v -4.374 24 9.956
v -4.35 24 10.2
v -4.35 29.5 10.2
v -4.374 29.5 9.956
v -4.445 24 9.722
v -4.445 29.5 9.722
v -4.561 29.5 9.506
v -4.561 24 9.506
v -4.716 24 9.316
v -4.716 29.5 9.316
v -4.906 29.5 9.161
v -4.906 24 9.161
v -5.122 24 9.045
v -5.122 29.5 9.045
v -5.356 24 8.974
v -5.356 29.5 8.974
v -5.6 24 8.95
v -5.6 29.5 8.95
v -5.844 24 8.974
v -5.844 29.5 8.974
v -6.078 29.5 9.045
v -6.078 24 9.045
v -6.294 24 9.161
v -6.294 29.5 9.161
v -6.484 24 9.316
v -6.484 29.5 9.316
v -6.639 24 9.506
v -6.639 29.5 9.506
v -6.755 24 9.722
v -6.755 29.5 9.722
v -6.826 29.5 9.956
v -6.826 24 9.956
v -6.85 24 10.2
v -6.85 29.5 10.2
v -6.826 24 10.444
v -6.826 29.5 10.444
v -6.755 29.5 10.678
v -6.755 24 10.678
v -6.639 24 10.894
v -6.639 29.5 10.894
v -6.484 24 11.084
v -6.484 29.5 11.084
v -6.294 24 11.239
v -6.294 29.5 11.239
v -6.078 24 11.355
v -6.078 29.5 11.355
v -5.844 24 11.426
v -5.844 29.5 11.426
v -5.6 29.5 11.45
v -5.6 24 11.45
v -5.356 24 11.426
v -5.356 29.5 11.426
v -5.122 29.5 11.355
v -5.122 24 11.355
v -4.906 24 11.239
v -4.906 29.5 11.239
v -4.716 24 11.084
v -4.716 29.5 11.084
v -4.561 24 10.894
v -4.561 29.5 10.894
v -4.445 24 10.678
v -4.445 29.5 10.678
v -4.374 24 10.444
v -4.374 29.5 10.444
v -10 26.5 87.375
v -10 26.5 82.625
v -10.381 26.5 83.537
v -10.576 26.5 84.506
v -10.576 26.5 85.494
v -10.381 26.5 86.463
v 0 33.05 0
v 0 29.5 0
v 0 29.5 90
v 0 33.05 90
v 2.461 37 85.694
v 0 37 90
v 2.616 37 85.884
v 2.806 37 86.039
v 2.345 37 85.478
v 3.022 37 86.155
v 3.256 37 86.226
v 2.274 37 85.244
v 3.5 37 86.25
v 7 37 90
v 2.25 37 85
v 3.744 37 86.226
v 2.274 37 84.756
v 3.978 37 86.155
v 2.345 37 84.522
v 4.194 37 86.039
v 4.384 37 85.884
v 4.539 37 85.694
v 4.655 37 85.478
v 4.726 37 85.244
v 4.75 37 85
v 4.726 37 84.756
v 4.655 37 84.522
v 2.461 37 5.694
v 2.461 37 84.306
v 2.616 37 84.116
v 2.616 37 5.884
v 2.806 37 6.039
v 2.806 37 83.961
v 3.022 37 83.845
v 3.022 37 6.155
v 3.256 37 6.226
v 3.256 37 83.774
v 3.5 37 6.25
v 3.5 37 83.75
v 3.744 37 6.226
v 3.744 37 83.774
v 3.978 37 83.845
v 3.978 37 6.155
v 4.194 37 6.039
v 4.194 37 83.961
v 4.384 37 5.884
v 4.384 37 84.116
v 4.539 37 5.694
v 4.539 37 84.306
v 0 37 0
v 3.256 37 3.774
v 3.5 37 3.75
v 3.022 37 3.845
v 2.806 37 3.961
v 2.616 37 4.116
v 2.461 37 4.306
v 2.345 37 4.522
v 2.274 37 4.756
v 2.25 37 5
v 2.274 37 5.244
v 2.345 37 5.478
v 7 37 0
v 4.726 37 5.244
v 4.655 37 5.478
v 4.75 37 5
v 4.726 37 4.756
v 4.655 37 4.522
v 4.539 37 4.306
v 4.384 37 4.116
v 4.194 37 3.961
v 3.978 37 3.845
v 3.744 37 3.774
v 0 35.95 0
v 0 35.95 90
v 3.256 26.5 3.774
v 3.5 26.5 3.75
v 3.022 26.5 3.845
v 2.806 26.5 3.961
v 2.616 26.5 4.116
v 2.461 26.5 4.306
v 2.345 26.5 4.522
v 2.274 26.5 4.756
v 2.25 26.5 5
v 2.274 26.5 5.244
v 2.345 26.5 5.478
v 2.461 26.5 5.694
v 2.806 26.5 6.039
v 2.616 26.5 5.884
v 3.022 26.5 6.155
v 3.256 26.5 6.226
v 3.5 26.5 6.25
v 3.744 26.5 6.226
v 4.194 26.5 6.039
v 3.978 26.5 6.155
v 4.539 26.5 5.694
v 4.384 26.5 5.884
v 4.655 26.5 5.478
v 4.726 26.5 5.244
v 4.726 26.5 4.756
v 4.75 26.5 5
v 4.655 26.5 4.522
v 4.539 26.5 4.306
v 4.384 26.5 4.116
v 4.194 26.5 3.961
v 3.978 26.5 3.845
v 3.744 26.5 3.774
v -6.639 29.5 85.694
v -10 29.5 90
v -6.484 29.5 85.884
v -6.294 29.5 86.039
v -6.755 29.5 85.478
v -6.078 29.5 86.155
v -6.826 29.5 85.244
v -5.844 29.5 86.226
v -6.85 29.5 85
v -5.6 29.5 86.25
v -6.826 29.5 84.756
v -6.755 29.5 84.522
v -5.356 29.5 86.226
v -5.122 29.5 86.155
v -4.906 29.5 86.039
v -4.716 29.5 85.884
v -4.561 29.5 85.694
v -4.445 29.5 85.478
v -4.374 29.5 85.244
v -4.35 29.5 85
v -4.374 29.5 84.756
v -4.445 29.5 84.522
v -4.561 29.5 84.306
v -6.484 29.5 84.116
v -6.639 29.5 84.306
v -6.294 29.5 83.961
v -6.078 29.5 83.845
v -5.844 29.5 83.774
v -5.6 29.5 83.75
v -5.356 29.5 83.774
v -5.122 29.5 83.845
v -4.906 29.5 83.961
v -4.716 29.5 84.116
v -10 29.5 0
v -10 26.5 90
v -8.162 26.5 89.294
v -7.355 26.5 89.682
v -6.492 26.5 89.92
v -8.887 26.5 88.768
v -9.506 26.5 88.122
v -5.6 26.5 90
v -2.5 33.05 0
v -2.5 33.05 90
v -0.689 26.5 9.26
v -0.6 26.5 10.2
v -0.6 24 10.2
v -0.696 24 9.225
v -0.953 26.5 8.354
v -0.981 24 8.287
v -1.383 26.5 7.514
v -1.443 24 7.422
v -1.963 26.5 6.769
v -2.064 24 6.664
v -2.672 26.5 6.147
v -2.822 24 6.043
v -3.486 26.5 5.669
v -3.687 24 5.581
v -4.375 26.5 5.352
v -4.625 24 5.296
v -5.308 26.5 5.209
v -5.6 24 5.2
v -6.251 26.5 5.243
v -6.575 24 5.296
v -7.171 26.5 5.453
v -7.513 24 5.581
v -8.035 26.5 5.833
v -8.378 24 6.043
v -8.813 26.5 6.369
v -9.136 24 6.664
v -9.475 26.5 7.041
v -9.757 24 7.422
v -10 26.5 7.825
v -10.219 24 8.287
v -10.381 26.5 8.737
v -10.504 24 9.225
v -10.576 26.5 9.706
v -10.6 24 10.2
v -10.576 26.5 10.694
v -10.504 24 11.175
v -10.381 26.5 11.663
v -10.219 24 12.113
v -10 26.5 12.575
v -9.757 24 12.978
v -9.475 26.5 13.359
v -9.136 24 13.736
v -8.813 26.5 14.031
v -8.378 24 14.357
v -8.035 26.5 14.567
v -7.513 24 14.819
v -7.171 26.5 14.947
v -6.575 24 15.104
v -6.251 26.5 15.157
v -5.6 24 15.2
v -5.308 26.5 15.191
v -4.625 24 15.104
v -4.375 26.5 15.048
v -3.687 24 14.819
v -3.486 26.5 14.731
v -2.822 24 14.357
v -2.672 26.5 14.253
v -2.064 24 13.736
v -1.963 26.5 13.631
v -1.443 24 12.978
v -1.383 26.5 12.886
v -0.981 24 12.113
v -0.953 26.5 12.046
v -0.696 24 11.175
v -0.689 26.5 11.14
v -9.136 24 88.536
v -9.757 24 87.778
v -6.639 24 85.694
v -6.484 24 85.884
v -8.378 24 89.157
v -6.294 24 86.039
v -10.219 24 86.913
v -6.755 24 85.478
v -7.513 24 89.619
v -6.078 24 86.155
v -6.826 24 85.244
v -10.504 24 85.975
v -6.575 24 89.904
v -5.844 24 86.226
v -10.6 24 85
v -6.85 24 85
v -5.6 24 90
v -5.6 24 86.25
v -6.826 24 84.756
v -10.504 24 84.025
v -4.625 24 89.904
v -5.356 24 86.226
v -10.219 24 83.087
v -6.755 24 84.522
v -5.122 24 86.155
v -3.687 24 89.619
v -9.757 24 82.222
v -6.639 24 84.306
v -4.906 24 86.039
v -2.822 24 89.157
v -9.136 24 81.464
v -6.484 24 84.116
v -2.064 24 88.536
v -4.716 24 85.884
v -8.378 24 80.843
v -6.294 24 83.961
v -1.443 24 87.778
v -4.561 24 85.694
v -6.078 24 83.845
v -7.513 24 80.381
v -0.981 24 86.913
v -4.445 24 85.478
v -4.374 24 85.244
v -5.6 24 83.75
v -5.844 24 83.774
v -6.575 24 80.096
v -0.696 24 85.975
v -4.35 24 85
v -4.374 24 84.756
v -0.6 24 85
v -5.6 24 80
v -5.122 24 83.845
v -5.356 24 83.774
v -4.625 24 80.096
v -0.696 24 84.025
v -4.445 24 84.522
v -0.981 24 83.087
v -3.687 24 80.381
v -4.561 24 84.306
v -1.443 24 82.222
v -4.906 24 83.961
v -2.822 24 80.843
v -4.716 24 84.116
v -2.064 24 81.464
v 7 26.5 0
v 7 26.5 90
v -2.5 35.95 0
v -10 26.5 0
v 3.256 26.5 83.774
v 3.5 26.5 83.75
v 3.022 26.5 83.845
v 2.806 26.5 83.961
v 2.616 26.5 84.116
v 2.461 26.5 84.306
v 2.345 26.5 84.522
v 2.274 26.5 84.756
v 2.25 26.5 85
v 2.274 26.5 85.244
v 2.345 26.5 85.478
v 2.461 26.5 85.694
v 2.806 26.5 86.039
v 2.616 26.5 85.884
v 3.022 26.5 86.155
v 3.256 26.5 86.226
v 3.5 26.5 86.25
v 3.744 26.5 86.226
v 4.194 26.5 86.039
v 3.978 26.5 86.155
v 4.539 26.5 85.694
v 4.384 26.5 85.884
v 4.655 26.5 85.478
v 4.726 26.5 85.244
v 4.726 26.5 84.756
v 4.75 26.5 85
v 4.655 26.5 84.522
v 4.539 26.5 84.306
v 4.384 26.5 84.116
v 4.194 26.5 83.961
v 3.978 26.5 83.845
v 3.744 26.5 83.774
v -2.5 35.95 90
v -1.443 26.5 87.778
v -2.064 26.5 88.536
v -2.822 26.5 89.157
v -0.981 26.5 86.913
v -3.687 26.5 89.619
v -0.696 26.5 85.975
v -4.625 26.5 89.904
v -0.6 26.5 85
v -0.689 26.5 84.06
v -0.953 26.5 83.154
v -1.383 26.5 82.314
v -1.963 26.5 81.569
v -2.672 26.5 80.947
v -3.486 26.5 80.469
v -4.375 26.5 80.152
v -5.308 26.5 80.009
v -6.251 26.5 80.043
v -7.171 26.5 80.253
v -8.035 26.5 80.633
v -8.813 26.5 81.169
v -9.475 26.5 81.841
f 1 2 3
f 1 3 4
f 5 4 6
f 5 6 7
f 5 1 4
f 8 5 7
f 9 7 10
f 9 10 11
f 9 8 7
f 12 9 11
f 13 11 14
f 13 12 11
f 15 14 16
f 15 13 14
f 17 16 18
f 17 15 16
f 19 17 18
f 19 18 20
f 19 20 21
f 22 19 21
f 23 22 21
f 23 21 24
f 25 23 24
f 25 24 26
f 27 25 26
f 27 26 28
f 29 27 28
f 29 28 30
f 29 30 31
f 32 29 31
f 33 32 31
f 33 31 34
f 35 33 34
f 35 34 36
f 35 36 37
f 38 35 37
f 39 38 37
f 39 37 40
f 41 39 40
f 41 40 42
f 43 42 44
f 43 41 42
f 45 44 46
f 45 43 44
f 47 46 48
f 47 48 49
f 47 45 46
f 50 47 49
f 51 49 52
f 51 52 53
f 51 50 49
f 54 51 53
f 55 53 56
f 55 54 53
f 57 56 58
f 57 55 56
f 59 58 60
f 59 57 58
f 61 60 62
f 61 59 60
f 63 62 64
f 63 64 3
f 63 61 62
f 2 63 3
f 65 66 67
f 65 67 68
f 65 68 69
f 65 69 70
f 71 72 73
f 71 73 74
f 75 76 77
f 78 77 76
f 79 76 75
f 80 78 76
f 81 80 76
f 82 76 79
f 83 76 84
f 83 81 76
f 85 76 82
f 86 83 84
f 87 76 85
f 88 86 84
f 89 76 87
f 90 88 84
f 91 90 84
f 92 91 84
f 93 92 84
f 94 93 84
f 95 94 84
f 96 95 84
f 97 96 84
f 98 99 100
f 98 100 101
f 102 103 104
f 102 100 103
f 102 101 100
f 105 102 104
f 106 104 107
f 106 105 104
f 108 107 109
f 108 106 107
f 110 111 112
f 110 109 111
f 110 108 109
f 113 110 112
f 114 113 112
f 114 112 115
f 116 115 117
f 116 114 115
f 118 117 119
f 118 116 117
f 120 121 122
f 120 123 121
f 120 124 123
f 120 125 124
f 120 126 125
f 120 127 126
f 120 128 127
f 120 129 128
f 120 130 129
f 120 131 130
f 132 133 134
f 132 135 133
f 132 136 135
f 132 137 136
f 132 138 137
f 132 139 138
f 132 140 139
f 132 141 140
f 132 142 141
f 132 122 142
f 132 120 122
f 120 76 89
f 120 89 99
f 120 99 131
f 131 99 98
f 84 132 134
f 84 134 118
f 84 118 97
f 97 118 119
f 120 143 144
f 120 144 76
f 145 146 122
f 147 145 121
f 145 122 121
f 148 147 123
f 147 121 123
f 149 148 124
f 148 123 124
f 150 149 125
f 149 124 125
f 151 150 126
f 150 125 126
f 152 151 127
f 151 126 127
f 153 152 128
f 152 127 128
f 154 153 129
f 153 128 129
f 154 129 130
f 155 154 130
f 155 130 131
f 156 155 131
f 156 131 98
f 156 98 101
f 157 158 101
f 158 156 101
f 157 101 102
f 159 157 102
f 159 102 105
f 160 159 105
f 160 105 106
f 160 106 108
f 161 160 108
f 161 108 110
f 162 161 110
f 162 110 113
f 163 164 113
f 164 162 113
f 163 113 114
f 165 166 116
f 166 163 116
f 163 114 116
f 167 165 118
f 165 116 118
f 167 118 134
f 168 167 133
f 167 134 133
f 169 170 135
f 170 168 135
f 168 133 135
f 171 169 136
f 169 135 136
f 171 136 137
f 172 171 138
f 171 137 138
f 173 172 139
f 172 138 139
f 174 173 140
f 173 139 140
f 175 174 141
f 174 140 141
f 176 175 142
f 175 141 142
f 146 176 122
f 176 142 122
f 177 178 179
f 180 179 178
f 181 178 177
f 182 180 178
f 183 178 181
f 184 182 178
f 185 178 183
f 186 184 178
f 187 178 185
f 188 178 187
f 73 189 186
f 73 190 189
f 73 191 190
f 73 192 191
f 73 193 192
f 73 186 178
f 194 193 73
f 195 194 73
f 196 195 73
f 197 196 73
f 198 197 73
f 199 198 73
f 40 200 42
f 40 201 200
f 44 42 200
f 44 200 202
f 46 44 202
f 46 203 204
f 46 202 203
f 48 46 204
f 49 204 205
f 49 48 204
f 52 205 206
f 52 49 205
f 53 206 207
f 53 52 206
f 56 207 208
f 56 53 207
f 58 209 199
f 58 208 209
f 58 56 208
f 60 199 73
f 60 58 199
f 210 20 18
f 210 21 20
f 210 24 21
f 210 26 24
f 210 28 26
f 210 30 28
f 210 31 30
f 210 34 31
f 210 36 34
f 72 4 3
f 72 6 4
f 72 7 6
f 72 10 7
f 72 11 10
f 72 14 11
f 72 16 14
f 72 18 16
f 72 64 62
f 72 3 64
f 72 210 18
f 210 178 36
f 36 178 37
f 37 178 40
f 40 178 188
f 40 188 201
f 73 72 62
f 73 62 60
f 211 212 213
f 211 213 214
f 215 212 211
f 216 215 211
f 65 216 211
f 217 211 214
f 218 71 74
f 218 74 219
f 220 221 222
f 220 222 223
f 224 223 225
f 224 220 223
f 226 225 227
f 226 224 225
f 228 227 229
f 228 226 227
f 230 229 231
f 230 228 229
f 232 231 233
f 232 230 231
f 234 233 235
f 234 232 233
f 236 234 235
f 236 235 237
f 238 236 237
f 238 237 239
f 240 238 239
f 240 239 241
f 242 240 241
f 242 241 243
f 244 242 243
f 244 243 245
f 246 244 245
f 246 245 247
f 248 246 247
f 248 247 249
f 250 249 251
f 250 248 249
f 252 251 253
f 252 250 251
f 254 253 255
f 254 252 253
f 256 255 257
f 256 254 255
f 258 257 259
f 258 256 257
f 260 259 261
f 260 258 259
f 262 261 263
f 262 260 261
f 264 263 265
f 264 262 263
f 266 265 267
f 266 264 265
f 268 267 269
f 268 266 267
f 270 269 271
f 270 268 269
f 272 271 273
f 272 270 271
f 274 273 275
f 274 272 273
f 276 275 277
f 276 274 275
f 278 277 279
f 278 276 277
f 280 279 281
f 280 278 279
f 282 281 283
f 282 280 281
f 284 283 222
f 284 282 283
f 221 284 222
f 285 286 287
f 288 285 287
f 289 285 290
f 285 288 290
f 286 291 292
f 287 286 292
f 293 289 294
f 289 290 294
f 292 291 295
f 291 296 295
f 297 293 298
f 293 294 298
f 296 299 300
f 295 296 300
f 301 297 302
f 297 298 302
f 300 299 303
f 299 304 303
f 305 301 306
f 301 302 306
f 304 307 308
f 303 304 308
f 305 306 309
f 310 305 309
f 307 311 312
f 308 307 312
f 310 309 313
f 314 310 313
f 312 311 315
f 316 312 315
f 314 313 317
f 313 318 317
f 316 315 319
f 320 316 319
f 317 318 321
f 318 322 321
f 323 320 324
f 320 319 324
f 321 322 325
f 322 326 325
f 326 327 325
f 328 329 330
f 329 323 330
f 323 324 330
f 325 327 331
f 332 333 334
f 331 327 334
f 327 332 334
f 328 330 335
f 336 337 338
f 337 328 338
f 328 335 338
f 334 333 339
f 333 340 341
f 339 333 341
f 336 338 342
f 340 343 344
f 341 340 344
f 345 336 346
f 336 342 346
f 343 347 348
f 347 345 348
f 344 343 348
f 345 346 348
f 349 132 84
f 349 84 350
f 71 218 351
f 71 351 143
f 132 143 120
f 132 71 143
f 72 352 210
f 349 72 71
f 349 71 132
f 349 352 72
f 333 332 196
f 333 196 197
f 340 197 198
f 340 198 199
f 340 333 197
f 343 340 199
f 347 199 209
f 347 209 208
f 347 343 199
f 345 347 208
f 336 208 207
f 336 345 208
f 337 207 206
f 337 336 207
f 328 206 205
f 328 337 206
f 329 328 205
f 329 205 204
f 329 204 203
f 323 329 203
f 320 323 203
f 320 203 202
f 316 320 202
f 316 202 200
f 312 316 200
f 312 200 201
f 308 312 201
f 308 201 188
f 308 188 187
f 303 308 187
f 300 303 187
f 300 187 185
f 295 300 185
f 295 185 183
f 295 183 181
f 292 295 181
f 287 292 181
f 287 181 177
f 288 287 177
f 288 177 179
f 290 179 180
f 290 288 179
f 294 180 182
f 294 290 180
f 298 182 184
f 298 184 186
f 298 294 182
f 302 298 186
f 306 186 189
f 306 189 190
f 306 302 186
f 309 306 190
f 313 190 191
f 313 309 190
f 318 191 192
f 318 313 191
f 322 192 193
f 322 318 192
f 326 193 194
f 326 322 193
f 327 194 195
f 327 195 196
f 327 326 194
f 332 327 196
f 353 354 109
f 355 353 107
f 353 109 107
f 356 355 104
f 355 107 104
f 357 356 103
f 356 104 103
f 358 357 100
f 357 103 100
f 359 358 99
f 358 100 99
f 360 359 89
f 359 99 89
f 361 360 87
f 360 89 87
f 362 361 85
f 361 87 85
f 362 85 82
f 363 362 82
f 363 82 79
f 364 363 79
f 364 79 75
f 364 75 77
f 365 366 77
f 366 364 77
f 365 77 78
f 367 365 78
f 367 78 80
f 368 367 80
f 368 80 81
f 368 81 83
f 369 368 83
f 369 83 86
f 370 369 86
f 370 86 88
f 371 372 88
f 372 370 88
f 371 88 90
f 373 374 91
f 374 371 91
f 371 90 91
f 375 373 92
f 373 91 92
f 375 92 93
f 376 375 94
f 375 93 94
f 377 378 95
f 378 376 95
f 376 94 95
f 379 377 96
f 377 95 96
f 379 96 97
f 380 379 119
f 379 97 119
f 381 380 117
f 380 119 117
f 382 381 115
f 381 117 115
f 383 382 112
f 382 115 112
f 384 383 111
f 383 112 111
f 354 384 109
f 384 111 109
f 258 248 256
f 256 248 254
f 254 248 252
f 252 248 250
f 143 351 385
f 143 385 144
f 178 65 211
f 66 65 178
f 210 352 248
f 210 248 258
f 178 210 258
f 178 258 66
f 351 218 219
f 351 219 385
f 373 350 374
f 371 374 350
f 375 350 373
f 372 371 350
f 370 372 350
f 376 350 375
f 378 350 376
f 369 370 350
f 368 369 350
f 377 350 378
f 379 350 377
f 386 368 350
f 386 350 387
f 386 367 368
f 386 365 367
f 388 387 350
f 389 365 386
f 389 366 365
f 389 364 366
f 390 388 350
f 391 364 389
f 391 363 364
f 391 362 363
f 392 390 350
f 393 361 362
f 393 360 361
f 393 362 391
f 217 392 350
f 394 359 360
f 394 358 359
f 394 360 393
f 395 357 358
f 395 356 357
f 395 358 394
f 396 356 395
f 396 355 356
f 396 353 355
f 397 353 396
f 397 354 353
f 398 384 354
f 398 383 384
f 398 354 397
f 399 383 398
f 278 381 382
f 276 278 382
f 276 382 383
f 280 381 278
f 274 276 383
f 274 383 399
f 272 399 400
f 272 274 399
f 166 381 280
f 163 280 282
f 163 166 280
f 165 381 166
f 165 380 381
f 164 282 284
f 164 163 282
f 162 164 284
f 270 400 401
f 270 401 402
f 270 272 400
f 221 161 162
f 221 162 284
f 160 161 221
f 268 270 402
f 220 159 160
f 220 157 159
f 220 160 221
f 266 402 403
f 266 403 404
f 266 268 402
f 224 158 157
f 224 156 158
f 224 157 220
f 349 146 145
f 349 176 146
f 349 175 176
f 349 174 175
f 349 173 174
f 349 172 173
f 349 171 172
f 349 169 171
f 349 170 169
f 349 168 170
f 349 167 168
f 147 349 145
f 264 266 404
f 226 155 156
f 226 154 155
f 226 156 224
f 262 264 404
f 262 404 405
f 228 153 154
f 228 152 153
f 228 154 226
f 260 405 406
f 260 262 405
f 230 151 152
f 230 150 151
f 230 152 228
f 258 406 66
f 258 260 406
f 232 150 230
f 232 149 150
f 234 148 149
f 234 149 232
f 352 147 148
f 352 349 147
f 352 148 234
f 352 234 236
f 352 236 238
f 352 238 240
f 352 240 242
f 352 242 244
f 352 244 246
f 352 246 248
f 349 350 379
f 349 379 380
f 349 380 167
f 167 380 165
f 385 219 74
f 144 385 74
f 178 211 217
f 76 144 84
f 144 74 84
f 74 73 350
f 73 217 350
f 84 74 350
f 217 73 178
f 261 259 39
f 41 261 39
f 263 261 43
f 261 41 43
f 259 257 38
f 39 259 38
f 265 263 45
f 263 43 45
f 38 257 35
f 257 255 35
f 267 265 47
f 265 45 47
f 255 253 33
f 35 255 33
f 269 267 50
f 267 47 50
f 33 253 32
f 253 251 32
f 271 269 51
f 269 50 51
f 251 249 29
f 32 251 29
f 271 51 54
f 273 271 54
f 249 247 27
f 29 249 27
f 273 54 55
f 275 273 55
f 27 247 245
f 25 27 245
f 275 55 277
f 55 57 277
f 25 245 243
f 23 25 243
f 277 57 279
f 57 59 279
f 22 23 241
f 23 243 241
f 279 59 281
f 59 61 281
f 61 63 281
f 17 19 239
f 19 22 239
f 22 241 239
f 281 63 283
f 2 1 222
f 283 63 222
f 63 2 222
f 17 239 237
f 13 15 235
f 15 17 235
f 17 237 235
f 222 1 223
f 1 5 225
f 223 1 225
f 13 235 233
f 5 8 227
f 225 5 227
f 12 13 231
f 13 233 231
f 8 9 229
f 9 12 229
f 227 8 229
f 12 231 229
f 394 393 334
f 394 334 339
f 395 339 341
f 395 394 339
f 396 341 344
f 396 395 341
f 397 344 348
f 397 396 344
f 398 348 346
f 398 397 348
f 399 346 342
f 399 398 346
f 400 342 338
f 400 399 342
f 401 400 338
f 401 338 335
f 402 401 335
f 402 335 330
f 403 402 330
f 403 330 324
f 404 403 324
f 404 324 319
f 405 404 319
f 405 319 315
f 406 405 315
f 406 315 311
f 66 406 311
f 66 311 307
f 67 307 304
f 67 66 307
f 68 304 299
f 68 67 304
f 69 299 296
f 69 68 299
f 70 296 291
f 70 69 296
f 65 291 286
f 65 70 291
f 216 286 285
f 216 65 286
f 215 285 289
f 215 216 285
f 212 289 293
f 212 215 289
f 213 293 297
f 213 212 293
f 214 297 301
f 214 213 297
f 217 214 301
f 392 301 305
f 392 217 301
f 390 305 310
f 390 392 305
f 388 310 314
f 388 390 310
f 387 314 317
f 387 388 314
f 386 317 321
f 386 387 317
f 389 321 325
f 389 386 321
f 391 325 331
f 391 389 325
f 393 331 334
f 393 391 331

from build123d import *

# Parameters (mm, degrees)
MAIN_DEPTH         = 90
SKETCH2_R          = 5
PLOT_DEPTH         = 2.5
SKETCH3_R          = 1.25
HOLEFIX_DEPTH      = 14
SKETCH4_R          = 1.25
CUT_EXTRUDE4_DEPTH = 14
SKETCH5_W          = 31.518406853
SKETCH5_H          = 19.182170192
CUT_EXTRUDE5_DEPTH = 91


with BuildPart() as part:
    # Sketch1 → Main (new body)
    with BuildSketch(Plane.XY):
        Polygon((-10, 7.5), (0, 7.5), (0, 3.95), (-2.5, 3.95), (-2.5, 1.05), (0, 1.05), (0, 0), (7, 0), (7, 10.5), (-10, 10.5), align=None)
    extrude(amount=MAIN_DEPTH)

    # Sketch2 → Plot (add)
    with BuildSketch(Plane(origin=(0, 10.5, 0), x_dir=(1, 0, 0), z_dir=(0, 1, 0))):
        with Locations((-5.6, -85)):
            Circle(SKETCH2_R)
        with Locations((-5.6, -10.2)):
            Circle(SKETCH2_R)
    extrude(amount=PLOT_DEPTH)

    # Sketch3 → HoleFix (cut, through all)
    with BuildSketch(Plane(origin=(0, 13, 0), x_dir=(1, 0, 0), z_dir=(0, 1, 0))):
        with Locations((-5.6, -10.2)):
            Circle(SKETCH3_R)
        with Locations((-5.6, -85)):
            Circle(SKETCH3_R)
    extrude(amount=-HOLEFIX_DEPTH, mode=Mode.SUBTRACT)

    # Sketch4 → Cut-Extrude4 (cut, through all)
    with BuildSketch(Plane(origin=(7, 0, 0), x_dir=(0, 0, -1), z_dir=(0, 1, 0))):
        with Locations((-85, 3.5)):
            Circle(SKETCH4_R)
        with Locations((-5, 3.5)):
            Circle(SKETCH4_R)
    extrude(amount=CUT_EXTRUDE4_DEPTH, mode=Mode.SUBTRACT)


with BuildPart() as body_2:
    # Mirror2: mirrored copy
    add(part.part.mirror(Plane.ZX.offset(18.5)))


with BuildPart() as part_1:
    add(part.part)

    # Sketch5 → Cut-Extrude5 (cut, through all)
    with BuildSketch(Plane.XY.offset(90)):
        with Locations((-2.991193443, 6.5365617)):
            Rectangle(SKETCH5_W, SKETCH5_H)
    extrude(amount=-CUT_EXTRUDE5_DEPTH, mode=Mode.SUBTRACT)


solid = body_2.part
